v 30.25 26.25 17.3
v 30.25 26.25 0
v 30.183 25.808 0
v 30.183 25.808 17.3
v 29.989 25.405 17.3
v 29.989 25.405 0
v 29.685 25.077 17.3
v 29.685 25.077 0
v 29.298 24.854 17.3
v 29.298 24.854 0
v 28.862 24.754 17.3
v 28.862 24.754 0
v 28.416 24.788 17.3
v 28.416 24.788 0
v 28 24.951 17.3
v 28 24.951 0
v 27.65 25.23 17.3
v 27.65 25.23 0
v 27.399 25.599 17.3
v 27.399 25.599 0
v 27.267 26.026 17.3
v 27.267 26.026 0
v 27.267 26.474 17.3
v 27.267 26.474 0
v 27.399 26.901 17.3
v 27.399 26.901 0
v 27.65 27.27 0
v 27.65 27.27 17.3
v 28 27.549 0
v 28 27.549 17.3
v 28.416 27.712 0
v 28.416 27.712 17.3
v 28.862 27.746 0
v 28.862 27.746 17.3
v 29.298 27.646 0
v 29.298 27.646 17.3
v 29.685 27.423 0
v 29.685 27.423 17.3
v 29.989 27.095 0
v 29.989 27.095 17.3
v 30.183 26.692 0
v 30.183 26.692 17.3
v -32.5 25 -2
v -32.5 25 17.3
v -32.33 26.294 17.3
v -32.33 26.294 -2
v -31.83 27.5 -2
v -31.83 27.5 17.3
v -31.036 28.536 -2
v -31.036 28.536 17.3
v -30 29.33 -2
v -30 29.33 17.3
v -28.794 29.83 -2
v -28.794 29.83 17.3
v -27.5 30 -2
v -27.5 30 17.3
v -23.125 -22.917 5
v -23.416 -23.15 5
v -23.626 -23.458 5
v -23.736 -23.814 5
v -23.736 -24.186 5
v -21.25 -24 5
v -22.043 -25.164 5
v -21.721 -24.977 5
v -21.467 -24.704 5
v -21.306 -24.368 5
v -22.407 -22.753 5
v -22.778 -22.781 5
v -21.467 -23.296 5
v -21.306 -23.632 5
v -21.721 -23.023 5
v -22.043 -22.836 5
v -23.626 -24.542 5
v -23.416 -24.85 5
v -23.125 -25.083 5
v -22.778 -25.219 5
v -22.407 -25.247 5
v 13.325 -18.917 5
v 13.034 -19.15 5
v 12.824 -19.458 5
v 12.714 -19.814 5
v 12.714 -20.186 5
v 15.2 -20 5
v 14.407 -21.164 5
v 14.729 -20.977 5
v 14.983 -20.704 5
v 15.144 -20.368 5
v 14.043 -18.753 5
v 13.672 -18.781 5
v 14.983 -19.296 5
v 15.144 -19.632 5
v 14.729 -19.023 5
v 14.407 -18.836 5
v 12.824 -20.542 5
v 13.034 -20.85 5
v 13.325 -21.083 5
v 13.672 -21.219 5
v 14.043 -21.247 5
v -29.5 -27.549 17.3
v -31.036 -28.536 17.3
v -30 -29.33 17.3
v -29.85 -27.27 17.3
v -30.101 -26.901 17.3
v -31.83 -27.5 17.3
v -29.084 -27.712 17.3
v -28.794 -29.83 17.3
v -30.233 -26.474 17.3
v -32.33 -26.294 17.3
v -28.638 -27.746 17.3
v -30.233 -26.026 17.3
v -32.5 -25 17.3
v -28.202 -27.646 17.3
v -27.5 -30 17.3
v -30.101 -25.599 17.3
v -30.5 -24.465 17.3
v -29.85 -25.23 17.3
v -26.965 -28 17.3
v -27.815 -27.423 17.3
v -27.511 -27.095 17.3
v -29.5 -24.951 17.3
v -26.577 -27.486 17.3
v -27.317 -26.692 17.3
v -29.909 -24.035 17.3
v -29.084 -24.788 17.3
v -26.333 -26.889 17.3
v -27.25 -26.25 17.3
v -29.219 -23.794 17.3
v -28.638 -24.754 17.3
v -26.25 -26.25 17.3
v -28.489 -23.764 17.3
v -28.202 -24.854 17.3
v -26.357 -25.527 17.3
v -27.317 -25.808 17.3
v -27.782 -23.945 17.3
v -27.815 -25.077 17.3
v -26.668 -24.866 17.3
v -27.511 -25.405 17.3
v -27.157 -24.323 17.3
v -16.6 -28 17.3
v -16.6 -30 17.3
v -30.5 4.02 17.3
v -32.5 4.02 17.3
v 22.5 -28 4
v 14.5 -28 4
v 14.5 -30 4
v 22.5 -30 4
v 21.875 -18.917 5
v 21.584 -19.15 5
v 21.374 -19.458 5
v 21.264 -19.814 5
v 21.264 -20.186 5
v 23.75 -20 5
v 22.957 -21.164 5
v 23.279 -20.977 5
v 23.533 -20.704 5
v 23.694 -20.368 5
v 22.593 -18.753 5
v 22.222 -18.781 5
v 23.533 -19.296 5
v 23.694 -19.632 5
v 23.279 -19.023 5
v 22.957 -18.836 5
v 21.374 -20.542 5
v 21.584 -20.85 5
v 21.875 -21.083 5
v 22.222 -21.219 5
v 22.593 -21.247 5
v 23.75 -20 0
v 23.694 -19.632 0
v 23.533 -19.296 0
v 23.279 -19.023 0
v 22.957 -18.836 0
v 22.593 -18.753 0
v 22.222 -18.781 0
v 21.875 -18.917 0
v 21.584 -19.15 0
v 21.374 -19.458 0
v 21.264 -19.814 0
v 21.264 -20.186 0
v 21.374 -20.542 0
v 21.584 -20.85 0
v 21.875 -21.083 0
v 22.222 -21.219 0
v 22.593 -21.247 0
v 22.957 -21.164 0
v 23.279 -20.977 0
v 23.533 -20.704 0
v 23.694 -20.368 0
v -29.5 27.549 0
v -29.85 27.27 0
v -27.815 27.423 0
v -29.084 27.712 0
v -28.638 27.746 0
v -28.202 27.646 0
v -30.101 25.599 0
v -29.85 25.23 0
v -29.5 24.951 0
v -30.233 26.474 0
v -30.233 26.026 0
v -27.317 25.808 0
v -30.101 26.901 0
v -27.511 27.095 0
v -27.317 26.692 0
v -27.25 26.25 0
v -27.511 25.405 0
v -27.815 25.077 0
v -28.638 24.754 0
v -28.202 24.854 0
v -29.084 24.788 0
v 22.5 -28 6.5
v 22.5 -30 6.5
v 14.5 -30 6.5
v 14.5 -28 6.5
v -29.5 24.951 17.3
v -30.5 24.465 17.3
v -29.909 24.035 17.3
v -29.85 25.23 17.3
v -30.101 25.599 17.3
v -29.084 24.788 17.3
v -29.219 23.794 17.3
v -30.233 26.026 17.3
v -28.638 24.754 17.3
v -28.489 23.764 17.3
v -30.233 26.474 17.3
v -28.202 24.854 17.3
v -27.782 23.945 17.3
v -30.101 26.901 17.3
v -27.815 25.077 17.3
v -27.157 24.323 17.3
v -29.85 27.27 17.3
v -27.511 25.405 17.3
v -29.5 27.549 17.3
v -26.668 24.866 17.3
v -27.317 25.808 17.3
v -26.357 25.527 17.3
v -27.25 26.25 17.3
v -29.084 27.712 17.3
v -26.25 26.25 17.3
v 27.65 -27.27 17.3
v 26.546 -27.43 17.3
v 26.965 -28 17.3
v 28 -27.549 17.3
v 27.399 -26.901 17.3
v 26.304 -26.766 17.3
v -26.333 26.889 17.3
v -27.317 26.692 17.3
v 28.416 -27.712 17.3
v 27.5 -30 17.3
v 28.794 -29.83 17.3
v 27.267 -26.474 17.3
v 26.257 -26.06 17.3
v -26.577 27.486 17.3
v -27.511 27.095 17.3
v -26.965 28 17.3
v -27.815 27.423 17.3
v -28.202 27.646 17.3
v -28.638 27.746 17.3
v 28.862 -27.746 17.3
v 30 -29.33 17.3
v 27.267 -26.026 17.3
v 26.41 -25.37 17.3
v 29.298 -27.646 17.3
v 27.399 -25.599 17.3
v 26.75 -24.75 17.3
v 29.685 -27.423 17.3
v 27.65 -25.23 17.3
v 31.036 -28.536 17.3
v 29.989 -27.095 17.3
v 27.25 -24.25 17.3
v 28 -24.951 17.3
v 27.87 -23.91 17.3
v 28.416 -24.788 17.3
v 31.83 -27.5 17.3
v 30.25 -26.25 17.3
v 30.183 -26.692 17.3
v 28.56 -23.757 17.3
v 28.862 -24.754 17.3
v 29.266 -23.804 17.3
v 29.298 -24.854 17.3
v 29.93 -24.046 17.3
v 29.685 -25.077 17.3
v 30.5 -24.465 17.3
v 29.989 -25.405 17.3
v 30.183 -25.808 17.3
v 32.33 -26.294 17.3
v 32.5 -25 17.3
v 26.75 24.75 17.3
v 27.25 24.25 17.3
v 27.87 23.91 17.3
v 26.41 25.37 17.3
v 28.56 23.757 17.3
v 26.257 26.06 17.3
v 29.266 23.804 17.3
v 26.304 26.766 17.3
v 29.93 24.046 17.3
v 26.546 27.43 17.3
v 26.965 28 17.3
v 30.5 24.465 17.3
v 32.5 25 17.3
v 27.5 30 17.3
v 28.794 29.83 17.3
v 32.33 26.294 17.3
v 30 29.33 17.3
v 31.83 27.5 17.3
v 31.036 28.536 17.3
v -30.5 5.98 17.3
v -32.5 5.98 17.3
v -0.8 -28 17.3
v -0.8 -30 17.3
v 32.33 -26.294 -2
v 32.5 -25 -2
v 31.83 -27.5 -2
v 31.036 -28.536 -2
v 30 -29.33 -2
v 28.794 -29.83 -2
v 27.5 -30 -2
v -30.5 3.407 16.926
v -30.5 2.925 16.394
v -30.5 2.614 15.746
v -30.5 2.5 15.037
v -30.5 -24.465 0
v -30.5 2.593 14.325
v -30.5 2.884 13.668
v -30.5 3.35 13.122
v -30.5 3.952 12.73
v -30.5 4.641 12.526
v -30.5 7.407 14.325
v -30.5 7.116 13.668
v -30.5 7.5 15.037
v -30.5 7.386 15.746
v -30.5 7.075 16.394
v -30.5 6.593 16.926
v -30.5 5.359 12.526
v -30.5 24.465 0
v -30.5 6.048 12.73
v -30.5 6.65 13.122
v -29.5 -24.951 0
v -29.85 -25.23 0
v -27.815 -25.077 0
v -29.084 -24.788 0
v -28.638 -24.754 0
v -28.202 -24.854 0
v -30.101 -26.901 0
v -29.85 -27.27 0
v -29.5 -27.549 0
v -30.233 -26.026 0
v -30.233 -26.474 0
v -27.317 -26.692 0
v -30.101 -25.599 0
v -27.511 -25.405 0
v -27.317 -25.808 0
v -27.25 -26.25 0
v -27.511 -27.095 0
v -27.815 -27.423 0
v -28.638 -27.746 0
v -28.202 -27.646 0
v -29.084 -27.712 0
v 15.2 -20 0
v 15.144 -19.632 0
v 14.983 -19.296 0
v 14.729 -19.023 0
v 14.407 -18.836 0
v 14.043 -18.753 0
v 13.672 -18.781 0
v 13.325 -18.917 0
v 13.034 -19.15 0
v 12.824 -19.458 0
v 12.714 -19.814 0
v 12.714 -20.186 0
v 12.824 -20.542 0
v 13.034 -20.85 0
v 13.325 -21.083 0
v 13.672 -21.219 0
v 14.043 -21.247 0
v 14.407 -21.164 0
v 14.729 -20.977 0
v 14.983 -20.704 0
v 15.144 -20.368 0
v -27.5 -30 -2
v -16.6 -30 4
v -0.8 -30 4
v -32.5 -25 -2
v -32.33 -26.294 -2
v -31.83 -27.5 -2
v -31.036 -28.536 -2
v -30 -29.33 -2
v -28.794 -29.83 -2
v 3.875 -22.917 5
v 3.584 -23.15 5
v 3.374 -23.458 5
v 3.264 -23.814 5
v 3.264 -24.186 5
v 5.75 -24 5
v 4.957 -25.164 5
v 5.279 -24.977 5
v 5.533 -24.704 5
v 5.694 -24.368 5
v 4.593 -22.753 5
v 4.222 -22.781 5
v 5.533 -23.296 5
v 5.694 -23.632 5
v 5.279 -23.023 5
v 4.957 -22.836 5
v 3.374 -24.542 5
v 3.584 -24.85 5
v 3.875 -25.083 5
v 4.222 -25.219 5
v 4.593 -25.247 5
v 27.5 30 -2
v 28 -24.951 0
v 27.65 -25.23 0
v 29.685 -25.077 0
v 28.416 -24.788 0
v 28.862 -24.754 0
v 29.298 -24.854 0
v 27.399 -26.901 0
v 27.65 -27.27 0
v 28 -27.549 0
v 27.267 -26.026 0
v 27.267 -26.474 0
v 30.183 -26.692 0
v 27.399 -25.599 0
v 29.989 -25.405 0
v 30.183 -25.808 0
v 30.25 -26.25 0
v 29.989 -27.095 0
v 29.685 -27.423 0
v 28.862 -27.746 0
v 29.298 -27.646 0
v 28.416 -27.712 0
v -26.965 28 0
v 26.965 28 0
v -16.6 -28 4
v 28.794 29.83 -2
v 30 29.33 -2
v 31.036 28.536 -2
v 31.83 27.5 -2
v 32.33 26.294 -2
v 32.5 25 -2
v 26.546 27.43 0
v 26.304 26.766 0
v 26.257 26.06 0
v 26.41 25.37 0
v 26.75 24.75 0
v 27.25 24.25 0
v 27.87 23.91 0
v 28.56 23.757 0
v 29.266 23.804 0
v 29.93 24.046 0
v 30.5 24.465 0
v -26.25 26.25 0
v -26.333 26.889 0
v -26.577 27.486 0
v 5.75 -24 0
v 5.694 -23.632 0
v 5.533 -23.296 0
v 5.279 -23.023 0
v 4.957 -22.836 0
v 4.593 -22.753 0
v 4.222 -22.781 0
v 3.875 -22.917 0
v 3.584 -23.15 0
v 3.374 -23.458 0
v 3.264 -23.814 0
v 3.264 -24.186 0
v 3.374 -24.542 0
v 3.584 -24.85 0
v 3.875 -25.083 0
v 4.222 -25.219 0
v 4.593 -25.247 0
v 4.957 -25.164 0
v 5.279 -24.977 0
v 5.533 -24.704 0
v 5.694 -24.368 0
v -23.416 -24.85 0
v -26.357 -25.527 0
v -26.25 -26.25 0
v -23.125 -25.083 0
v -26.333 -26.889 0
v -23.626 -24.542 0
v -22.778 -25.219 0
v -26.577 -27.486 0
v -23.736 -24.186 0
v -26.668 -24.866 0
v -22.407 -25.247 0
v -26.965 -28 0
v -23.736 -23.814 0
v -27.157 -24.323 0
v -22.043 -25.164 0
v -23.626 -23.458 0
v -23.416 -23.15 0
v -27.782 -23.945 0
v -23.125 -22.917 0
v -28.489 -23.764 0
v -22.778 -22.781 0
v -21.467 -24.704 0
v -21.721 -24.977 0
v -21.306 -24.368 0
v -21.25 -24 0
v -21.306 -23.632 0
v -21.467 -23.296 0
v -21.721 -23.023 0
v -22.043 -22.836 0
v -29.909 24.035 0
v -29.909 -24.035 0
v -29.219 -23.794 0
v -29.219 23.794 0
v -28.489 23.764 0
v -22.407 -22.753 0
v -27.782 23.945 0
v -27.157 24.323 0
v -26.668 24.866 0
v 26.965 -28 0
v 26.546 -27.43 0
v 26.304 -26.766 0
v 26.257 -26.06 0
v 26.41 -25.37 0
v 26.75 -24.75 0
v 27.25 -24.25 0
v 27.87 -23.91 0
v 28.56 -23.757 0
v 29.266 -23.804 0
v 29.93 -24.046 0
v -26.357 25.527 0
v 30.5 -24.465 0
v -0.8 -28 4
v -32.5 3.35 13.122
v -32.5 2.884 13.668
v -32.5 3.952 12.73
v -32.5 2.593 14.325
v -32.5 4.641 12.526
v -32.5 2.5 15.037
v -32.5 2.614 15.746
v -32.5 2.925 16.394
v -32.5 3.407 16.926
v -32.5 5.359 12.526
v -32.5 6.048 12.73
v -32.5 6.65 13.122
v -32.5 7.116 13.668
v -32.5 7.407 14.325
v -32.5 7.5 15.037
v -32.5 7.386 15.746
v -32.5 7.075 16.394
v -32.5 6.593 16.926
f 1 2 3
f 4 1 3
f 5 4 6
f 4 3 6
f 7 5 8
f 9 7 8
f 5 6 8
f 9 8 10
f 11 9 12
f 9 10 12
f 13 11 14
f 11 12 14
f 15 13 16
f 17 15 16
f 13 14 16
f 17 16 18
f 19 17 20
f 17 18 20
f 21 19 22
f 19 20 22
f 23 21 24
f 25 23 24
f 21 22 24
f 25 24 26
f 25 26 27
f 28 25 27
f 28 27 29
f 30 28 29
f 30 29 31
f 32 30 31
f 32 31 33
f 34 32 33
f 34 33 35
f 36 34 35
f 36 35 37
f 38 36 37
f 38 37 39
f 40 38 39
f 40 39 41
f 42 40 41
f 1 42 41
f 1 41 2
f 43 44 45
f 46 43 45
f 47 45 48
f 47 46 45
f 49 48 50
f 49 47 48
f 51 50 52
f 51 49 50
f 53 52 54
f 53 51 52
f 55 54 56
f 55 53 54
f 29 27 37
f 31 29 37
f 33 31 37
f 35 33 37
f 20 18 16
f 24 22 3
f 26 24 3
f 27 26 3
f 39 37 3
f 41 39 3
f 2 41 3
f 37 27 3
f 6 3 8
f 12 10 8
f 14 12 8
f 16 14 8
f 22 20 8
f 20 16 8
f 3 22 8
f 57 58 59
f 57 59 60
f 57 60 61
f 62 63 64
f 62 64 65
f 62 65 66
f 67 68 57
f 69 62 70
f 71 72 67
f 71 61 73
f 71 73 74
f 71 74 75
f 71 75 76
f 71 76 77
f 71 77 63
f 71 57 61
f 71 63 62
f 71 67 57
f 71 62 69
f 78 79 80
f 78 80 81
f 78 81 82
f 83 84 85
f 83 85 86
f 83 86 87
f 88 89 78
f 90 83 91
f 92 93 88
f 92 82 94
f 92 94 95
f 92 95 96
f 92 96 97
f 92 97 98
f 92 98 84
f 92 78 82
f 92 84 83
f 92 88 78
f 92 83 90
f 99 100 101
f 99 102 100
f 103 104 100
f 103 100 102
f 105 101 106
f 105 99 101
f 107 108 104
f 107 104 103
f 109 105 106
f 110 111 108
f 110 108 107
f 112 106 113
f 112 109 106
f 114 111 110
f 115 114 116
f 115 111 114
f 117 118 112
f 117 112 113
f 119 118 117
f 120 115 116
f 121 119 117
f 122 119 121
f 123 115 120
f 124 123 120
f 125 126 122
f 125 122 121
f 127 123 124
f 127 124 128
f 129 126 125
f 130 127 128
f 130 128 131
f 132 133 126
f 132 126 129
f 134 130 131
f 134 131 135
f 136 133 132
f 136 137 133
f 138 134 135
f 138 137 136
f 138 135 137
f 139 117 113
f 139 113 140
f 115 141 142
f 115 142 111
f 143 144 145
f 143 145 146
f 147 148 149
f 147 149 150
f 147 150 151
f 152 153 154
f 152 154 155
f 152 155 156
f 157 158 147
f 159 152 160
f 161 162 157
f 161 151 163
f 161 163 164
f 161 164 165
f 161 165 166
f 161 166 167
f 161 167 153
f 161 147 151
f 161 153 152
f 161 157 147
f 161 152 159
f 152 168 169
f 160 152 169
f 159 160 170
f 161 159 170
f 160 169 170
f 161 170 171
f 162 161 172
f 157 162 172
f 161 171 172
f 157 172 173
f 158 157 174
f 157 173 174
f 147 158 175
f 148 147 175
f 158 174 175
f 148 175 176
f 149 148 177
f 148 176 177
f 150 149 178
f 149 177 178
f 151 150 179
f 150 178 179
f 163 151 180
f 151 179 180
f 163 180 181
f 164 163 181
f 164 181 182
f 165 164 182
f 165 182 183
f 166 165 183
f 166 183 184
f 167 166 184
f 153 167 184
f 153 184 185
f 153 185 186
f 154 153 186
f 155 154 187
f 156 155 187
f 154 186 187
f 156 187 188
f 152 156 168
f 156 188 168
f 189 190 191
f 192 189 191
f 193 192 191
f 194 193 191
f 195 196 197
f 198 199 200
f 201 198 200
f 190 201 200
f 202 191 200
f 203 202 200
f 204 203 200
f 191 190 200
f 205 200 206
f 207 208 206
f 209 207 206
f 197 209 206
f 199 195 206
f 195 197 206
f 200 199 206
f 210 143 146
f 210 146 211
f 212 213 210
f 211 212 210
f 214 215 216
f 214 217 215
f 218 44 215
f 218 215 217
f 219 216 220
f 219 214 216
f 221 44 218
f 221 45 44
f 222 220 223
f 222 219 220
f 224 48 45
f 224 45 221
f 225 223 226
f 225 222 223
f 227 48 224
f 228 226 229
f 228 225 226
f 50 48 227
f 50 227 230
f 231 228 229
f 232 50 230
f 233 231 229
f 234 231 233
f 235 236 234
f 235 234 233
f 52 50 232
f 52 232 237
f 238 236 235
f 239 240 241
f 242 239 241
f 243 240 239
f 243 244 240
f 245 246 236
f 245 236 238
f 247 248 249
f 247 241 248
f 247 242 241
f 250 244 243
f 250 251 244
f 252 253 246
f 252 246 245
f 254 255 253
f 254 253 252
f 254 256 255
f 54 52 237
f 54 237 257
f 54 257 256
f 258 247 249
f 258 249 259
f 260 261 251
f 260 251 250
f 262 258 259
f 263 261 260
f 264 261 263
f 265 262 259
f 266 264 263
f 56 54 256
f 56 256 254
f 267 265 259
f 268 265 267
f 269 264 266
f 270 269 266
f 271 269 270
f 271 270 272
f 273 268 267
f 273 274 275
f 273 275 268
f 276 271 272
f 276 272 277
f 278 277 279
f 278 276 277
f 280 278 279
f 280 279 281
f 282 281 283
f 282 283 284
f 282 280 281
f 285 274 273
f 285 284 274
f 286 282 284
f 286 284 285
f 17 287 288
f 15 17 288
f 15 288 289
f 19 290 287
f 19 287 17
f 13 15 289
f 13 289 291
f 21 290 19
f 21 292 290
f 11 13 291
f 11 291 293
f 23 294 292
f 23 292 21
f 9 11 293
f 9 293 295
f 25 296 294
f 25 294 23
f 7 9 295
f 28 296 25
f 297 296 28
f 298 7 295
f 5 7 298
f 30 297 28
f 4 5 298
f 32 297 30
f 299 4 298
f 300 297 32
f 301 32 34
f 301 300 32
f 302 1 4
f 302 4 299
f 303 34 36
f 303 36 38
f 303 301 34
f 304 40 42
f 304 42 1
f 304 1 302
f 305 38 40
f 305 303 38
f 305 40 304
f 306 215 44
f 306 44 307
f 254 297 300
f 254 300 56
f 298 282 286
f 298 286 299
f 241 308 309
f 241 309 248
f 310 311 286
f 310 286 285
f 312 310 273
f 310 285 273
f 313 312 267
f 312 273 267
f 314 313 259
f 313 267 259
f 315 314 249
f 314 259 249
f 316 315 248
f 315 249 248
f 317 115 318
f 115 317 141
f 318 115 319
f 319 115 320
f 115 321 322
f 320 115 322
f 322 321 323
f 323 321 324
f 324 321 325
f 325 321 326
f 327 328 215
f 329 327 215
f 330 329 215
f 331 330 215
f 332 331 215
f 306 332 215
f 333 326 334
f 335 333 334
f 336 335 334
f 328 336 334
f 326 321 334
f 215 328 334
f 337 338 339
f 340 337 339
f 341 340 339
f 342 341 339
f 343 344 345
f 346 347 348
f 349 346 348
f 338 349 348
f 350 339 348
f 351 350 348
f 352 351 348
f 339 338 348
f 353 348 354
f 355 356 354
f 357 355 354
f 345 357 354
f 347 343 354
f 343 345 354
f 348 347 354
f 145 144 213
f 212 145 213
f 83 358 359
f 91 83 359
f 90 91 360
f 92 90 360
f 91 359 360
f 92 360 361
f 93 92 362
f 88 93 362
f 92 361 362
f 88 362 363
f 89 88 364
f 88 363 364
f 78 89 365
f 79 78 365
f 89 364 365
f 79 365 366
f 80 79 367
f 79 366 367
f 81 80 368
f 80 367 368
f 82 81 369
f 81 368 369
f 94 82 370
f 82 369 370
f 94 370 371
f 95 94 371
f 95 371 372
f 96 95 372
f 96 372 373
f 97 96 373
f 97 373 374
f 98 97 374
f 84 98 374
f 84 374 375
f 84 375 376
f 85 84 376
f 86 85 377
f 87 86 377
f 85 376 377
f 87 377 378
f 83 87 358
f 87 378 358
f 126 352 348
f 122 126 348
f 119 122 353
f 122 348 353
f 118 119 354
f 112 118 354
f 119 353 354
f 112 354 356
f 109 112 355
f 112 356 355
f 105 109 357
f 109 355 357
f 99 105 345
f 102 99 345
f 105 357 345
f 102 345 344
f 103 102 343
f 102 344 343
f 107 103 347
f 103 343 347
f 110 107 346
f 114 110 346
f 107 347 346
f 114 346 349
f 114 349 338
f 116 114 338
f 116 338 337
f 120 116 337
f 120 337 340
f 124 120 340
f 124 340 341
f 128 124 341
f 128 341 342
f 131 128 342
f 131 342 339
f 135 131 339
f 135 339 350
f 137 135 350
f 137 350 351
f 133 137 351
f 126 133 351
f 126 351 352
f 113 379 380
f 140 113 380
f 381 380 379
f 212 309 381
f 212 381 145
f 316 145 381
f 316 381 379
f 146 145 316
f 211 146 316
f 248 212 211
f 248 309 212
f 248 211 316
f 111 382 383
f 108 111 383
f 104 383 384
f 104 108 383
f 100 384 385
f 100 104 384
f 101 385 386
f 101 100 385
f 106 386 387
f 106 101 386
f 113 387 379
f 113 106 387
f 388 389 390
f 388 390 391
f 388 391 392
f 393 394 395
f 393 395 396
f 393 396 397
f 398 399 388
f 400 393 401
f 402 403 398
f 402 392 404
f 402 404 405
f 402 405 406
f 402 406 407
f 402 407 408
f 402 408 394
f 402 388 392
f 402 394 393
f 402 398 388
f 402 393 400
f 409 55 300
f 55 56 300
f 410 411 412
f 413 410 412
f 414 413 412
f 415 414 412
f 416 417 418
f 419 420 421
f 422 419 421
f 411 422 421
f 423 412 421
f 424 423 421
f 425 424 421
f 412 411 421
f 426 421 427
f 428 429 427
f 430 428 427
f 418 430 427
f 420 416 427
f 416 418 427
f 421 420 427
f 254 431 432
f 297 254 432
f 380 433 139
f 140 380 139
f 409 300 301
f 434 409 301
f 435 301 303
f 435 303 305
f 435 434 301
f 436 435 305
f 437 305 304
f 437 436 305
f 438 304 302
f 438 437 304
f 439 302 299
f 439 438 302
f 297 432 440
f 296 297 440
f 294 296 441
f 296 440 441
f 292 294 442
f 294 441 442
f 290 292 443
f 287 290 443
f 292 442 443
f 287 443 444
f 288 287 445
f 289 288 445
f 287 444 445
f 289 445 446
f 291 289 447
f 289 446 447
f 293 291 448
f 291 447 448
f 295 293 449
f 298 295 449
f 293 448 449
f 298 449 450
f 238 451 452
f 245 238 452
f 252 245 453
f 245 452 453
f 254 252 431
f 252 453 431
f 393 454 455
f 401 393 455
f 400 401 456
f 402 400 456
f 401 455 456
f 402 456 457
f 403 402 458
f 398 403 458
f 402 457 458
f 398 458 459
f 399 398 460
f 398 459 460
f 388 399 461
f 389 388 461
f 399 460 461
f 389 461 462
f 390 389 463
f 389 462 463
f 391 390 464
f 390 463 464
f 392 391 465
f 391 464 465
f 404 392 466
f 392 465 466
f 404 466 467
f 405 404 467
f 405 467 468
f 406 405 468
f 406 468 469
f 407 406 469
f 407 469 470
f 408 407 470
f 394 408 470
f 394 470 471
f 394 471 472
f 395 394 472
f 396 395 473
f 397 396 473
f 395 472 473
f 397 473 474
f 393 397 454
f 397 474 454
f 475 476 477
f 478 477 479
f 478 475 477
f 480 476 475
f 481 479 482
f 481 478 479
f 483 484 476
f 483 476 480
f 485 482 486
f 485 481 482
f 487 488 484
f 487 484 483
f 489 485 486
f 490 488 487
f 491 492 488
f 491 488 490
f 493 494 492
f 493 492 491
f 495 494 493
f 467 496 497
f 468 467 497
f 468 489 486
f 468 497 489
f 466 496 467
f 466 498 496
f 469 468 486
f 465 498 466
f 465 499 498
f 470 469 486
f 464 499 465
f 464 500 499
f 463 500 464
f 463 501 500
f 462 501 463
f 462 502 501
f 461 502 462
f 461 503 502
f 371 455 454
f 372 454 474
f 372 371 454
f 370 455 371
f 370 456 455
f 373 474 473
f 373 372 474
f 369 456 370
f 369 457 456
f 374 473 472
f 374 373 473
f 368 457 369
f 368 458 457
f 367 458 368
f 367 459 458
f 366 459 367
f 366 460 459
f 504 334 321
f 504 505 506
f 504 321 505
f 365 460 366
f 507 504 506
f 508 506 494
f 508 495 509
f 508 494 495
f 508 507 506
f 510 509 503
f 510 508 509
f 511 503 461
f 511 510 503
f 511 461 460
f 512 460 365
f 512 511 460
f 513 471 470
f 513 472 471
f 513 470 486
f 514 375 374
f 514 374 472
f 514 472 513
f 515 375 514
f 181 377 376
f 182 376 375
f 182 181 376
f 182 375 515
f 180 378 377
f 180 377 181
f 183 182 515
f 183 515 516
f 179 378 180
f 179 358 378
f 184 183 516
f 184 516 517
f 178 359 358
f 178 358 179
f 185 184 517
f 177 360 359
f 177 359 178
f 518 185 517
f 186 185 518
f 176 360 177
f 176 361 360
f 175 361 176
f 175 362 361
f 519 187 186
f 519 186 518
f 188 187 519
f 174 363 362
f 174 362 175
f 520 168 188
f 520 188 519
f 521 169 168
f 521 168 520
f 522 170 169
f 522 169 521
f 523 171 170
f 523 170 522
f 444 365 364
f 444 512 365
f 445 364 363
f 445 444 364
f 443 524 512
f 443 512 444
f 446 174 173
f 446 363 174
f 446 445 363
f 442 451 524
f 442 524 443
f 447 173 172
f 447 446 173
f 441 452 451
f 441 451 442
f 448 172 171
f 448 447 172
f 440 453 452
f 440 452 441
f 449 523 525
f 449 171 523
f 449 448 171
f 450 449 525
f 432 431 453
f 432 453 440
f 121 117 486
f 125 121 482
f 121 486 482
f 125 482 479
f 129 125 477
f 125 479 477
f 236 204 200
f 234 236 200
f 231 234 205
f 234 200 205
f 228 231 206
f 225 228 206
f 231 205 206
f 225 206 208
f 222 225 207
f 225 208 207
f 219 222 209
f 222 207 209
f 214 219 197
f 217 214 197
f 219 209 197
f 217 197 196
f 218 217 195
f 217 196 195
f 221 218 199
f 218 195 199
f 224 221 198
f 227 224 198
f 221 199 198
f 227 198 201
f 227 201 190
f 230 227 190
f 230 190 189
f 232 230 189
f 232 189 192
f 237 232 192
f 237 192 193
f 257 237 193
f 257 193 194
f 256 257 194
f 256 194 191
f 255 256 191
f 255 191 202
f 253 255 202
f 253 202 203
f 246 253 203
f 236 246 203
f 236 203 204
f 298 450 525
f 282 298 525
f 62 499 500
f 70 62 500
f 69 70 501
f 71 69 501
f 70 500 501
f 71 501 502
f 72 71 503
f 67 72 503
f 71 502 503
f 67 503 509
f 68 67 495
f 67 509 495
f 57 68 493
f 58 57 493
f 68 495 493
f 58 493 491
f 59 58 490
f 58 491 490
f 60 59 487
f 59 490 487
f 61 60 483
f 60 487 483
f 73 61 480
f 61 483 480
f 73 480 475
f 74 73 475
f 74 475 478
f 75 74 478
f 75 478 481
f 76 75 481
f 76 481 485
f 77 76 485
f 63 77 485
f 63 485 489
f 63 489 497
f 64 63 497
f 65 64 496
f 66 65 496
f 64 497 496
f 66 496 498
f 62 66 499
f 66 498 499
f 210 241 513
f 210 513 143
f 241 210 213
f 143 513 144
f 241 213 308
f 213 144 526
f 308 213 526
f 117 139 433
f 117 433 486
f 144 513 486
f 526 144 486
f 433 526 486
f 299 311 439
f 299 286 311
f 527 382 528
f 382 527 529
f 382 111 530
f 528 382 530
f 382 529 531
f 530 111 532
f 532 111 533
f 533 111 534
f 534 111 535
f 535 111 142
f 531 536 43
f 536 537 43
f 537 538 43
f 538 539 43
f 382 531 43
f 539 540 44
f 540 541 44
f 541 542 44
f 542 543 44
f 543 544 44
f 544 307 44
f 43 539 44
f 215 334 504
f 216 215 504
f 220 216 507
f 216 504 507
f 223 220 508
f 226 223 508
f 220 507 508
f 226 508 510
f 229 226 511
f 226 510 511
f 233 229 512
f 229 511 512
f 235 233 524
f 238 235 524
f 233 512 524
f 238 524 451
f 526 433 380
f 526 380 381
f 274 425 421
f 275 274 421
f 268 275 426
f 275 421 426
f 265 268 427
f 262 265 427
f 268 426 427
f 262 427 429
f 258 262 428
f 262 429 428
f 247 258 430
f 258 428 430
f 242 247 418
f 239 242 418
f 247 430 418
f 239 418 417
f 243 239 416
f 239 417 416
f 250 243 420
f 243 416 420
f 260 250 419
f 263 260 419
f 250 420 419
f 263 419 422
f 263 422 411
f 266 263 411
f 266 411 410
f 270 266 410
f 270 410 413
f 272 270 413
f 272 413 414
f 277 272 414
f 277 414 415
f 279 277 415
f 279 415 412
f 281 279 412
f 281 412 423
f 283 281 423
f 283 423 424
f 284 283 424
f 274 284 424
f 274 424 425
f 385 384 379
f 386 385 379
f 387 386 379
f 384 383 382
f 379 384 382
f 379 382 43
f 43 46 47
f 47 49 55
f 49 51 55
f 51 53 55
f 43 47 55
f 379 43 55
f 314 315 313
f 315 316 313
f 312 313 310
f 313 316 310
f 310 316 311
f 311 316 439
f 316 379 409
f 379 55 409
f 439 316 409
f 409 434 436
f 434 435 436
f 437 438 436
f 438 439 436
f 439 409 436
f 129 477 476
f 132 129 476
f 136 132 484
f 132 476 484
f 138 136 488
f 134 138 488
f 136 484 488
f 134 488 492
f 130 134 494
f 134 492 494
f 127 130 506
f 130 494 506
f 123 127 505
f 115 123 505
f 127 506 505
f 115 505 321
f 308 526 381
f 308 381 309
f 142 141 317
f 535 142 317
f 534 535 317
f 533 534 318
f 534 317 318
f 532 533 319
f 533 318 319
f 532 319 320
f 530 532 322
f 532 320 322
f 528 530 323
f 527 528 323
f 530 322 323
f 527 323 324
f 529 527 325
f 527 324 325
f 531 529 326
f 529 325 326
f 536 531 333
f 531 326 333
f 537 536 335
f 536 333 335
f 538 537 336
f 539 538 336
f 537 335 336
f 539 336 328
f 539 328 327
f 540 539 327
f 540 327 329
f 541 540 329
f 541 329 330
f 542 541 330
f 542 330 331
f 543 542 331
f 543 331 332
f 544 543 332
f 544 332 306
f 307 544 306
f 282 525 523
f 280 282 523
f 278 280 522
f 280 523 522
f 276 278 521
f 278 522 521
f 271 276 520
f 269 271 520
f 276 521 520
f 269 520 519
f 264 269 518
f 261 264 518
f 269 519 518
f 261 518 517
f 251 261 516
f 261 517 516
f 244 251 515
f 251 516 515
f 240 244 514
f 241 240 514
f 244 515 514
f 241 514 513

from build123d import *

# Parameters (mm, degrees)
F0_W      = 65
F0_H      = 60
F1_DEPTH  = 17.3
F3_START  = 25
F2_W      = 15.8
F2_H      = 13.3
F3_DEPTH  = 2.5
F5_D      = 5
F5_DEPTH  = 32.501
F2_W_2    = 8
F2_H_2    = 2.5
F6_DEPTH  = 30
F0_R      = 1.25
F7_DEPTH  = 2
F8_DEPTH  = 5
F9_DEPTH  = 17.3
F10_D     = 3
F10_DEPTH = 22
F10_TIP   = 0.9012909285
F11_DEPTH = 30
F12_R     = 5


# Not quite as in the source:
# - a feature names something its author has since deleted; it is built from what else it names


with BuildPart() as f1:
    # F0 (on Top) → F1 (new body)
    with BuildSketch(Plane.XY):
        Rectangle(F0_W, F0_H)
        with BuildLine():
            ThreePointArc((-30.5, 24.4646428929), (-30.517766953, 28.017766953), (-26.9646428929, 28))
            Line((-26.9646428929, 28), (26.9646428929, 28))
            ThreePointArc((26.9646428929, 28), (29.6951474044, 28.5644537982), (31.25, 26.25))
            ThreePointArc((31.25, 26.25), (31.0548861143, 25.2817541634), (30.5, 24.4646428929))
            Line((30.5, 24.4646428929), (30.5, -24.4646428929))
            ThreePointArc((30.5, -24.4646428929), (31.0548861143, -25.2817541634), (31.25, -26.25))
            ThreePointArc((31.25, -26.25), (29.6951474044, -28.5644537982), (26.9646428929, -28))
            Line((26.9646428929, -28), (-26.9646428929, -28))
            ThreePointArc((-26.9646428929, -28), (-30.517766953, -28.017766953), (-30.5, -24.4646428929))
            Line((-30.5, -24.4646428929), (-30.5, 24.4646428929))
        make_face(mode=Mode.SUBTRACT)
    extrude(amount=F1_DEPTH)

    # F2 (on Front) → F3 (cut)
    with BuildSketch(Plane.XZ.offset(F3_START)):
        with Locations((-8.7, 10.65)):
            Rectangle(F2_W, F2_H)
    extrude(amount=F3_DEPTH, mode=Mode.SUBTRACT)

    # F5 (through all, one way)
    with BuildSketch(Plane.YZ):
        with Locations((5, 15)):
            Circle(F5_D / 2)
    extrude(amount=-F5_DEPTH, mode=Mode.SUBTRACT)

    # F2 (on Front) → F6 (cut)
    with BuildSketch(Plane.XZ):
        with Locations((18.5, 5.25)):
            Rectangle(F2_W_2, F2_H_2)
    extrude(amount=F6_DEPTH, mode=Mode.SUBTRACT)

    # F0 (on Top) → F7 (join)
    with BuildSketch(Plane.XY):
        Rectangle(F0_W, F0_H)
        with BuildLine():
            ThreePointArc((-30.5, 24.4646428929), (-30.517766953, 28.017766953), (-26.9646428929, 28))
            Line((-26.9646428929, 28), (26.9646428929, 28))
            ThreePointArc((26.9646428929, 28), (29.6951474044, 28.5644537982), (31.25, 26.25))
            ThreePointArc((31.25, 26.25), (31.0548861143, 25.2817541634), (30.5, 24.4646428929))
            Line((30.5, 24.4646428929), (30.5, -24.4646428929))
            ThreePointArc((30.5, -24.4646428929), (31.0548861143, -25.2817541634), (31.25, -26.25))
            ThreePointArc((31.25, -26.25), (29.6951474044, -28.5644537982), (26.9646428929, -28))
            Line((26.9646428929, -28), (-26.9646428929, -28))
            ThreePointArc((-26.9646428929, -28), (-30.517766953, -28.017766953), (-30.5, -24.4646428929))
            Line((-30.5, -24.4646428929), (-30.5, 24.4646428929))
        make_face(mode=Mode.SUBTRACT)
        with BuildLine():
            Line((26.9646428929, 28), (-26.9646428929, 28))
            ThreePointArc((-26.9646428929, 28), (-26.4355462018, 27.1951474044), (-26.25, 26.25))
            ThreePointArc((-26.25, 26.25), (-27.7817541634, 23.9451138857), (-30.5, 24.4646428929))
            Line((-30.5, 24.4646428929), (-30.5, -24.4646428929))
            ThreePointArc((-30.5, -24.4646428929), (-27.7817541634, -23.9451138857), (-26.25, -26.25))
            ThreePointArc((-26.25, -26.25), (-26.4355462018, -27.1951474044), (-26.9646428929, -28))
            Line((-26.9646428929, -28), (26.9646428929, -28))
            ThreePointArc((26.9646428929, -28), (26.982233047, -24.482233047), (30.5, -24.4646428929))
            Line((30.5, -24.4646428929), (30.5, 24.4646428929))
            ThreePointArc((30.5, 24.4646428929), (26.982233047, 24.482233047), (26.9646428929, 28))
        make_face()
        with Locations((-22.5, -24)):
            Circle(F0_R, mode=Mode.SUBTRACT)
        with Locations((4.5, -24)):
            Circle(F0_R, mode=Mode.SUBTRACT)
        with Locations((13.95, -20)):
            Circle(F0_R, mode=Mode.SUBTRACT)
        with Locations((22.5, -20)):
            Circle(F0_R, mode=Mode.SUBTRACT)
        with BuildLine():
            Line((-26.9646428929, 28), (-30.5, 28))
            Line((-30.5, 28), (-30.5, 24.4646428929))
            ThreePointArc((-30.5, 24.4646428929), (-27.7817541634, 23.9451138857), (-26.25, 26.25))
            ThreePointArc((-26.25, 26.25), (-26.4355462018, 27.1951474044), (-26.9646428929, 28))
        make_face()
        with BuildLine():
            Line((30.5, 28), (26.9646428929, 28))
            ThreePointArc((26.9646428929, 28), (26.982233047, 24.482233047), (30.5, 24.4646428929))
            Line((30.5, 24.4646428929), (30.5, 28))
        make_face()
        with BuildLine():
            ThreePointArc((-26.25, -26.25), (-27.7817541634, -23.9451138857), (-30.5, -24.4646428929))
            Line((-30.5, -24.4646428929), (-30.5, -28))
            Line((-30.5, -28), (-26.9646428929, -28))
            ThreePointArc((-26.9646428929, -28), (-26.4355462018, -27.1951474044), (-26.25, -26.25))
        make_face()
        with BuildLine():
            Line((30.5, -28), (30.5, -24.4646428929))
            ThreePointArc((30.5, -24.4646428929), (26.982233047, -24.482233047), (26.9646428929, -28))
            Line((26.9646428929, -28), (30.5, -28))
        make_face()
        with Locations((22.5, -20)):
            Circle(F0_R)
        with Locations((13.95, -20)):
            Circle(F0_R)
        with Locations((-22.5, -24)):
            Circle(F0_R)
        with Locations((4.5, -24)):
            Circle(F0_R)
        with BuildLine():
            Line((-30.5, 24.4646428929), (-30.5, 28))
            Line((-30.5, 28), (-26.9646428929, 28))
            ThreePointArc((-26.9646428929, 28), (-30.517766953, 28.017766953), (-30.5, 24.4646428929))
        make_face()
        with BuildLine():
            ThreePointArc((31.25, 26.25), (29.6951474044, 28.5644537982), (26.9646428929, 28))
            Line((26.9646428929, 28), (30.5, 28))
            Line((30.5, 28), (30.5, 24.4646428929))
            ThreePointArc((30.5, 24.4646428929), (31.0548861143, 25.2817541634), (31.25, 26.25))
        make_face()
        with BuildLine():
            Line((-30.5, -28), (-30.5, -24.4646428929))
            ThreePointArc((-30.5, -24.4646428929), (-30.517766953, -28.017766953), (-26.9646428929, -28))
            Line((-26.9646428929, -28), (-30.5, -28))
        make_face()
        with BuildLine():
            ThreePointArc((31.25, -26.25), (31.0548861143, -25.2817541634), (30.5, -24.4646428929))
            Line((30.5, -24.4646428929), (30.5, -28))
            Line((30.5, -28), (26.9646428929, -28))
            ThreePointArc((26.9646428929, -28), (29.6951474044, -28.5644537982), (31.25, -26.25))
        make_face()
    extrude(amount=-F7_DEPTH)

    # F0 (on Top) → F8 (join)
    with BuildSketch(Plane.XY):
        with Locations((22.5, -20)):
            Circle(F0_R)
        with Locations((13.95, -20)):
            Circle(F0_R)
        with Locations((-22.5, -24)):
            Circle(F0_R)
        with Locations((4.5, -24)):
            Circle(F0_R)
    extrude(amount=F8_DEPTH)

    # F0 (on Top) → F9 (join)
    with BuildSketch(Plane.XY):
        with BuildLine():
            Line((30.5, -28), (30.5, -24.4646428929))
            ThreePointArc((30.5, -24.4646428929), (26.982233047, -24.482233047), (26.9646428929, -28))
            Line((26.9646428929, -28), (30.5, -28))
        make_face()
        with BuildLine():
            ThreePointArc((31.25, -26.25), (31.0548861143, -25.2817541634), (30.5, -24.4646428929))
            Line((30.5, -24.4646428929), (30.5, -28))
            Line((30.5, -28), (26.9646428929, -28))
            ThreePointArc((26.9646428929, -28), (29.6951474044, -28.5644537982), (31.25, -26.25))
        make_face()
        with BuildLine():
            ThreePointArc((31.25, 26.25), (29.6951474044, 28.5644537982), (26.9646428929, 28))
            Line((26.9646428929, 28), (30.5, 28))
            Line((30.5, 28), (30.5, 24.4646428929))
            ThreePointArc((30.5, 24.4646428929), (31.0548861143, 25.2817541634), (31.25, 26.25))
        make_face()
        with BuildLine():
            Line((30.5, 28), (26.9646428929, 28))
            ThreePointArc((26.9646428929, 28), (26.982233047, 24.482233047), (30.5, 24.4646428929))
            Line((30.5, 24.4646428929), (30.5, 28))
        make_face()
        with BuildLine():
            Line((-26.9646428929, 28), (-30.5, 28))
            Line((-30.5, 28), (-30.5, 24.4646428929))
            ThreePointArc((-30.5, 24.4646428929), (-27.7817541634, 23.9451138857), (-26.25, 26.25))
            ThreePointArc((-26.25, 26.25), (-26.4355462018, 27.1951474044), (-26.9646428929, 28))
        make_face()
        with BuildLine():
            Line((-30.5, 24.4646428929), (-30.5, 28))
            Line((-30.5, 28), (-26.9646428929, 28))
            ThreePointArc((-26.9646428929, 28), (-30.517766953, 28.017766953), (-30.5, 24.4646428929))
        make_face()
        with BuildLine():
            Line((-30.5, -28), (-30.5, -24.4646428929))
            ThreePointArc((-30.5, -24.4646428929), (-30.517766953, -28.017766953), (-26.9646428929, -28))
            Line((-26.9646428929, -28), (-30.5, -28))
        make_face()
        with BuildLine():
            ThreePointArc((-26.25, -26.25), (-27.7817541634, -23.9451138857), (-30.5, -24.4646428929))
            Line((-30.5, -24.4646428929), (-30.5, -28))
            Line((-30.5, -28), (-26.9646428929, -28))
            ThreePointArc((-26.9646428929, -28), (-26.4355462018, -27.1951474044), (-26.25, -26.25))
        make_face()
    extrude(amount=F9_DEPTH)

    # F10 (one way)
    with BuildSketch(Plane(origin=(0, 0, 0), x_dir=(1, 0, 0), z_dir=(0, 0, -1))):
        with Locations((-28.75, -26.25), (28.75, -26.25), (28.75, 26.25), (-28.75, 26.25)):
            Circle(F10_D / 2)
    extrude(amount=-F10_DEPTH, mode=Mode.SUBTRACT)
    with Locations(Plane(origin=(0, 0, 0), x_dir=(1, 0, 0), z_dir=(0, 0, -1))):
        with Locations((-28.75, -26.25), (28.75, -26.25), (28.75, 26.25), (-28.75, 26.25)):
            with Locations((0, 0, -(F10_DEPTH + F10_TIP / 2))):  # 118° drill point
                Cone(0, F10_D / 2, F10_TIP, mode=Mode.SUBTRACT)

    # F2 (on Front) → F11 (cut)
    with BuildSketch(Plane.XZ):
        with Locations((-8.7, 10.65)):
            Rectangle(F2_W, F2_H)
    extrude(amount=F11_DEPTH, mode=Mode.SUBTRACT)

    # F12
    f12_edges = [f1.edges().sort_by_distance(p)[0] for p in [
        (32.5, -30, 7.65),
        (32.5, 30, 7.65),
        (-32.5, 30, 7.65),
        (-32.5, -30, 7.65),
    ]]
    fillet(f12_edges, radius=F12_R)


solid = f1.part
